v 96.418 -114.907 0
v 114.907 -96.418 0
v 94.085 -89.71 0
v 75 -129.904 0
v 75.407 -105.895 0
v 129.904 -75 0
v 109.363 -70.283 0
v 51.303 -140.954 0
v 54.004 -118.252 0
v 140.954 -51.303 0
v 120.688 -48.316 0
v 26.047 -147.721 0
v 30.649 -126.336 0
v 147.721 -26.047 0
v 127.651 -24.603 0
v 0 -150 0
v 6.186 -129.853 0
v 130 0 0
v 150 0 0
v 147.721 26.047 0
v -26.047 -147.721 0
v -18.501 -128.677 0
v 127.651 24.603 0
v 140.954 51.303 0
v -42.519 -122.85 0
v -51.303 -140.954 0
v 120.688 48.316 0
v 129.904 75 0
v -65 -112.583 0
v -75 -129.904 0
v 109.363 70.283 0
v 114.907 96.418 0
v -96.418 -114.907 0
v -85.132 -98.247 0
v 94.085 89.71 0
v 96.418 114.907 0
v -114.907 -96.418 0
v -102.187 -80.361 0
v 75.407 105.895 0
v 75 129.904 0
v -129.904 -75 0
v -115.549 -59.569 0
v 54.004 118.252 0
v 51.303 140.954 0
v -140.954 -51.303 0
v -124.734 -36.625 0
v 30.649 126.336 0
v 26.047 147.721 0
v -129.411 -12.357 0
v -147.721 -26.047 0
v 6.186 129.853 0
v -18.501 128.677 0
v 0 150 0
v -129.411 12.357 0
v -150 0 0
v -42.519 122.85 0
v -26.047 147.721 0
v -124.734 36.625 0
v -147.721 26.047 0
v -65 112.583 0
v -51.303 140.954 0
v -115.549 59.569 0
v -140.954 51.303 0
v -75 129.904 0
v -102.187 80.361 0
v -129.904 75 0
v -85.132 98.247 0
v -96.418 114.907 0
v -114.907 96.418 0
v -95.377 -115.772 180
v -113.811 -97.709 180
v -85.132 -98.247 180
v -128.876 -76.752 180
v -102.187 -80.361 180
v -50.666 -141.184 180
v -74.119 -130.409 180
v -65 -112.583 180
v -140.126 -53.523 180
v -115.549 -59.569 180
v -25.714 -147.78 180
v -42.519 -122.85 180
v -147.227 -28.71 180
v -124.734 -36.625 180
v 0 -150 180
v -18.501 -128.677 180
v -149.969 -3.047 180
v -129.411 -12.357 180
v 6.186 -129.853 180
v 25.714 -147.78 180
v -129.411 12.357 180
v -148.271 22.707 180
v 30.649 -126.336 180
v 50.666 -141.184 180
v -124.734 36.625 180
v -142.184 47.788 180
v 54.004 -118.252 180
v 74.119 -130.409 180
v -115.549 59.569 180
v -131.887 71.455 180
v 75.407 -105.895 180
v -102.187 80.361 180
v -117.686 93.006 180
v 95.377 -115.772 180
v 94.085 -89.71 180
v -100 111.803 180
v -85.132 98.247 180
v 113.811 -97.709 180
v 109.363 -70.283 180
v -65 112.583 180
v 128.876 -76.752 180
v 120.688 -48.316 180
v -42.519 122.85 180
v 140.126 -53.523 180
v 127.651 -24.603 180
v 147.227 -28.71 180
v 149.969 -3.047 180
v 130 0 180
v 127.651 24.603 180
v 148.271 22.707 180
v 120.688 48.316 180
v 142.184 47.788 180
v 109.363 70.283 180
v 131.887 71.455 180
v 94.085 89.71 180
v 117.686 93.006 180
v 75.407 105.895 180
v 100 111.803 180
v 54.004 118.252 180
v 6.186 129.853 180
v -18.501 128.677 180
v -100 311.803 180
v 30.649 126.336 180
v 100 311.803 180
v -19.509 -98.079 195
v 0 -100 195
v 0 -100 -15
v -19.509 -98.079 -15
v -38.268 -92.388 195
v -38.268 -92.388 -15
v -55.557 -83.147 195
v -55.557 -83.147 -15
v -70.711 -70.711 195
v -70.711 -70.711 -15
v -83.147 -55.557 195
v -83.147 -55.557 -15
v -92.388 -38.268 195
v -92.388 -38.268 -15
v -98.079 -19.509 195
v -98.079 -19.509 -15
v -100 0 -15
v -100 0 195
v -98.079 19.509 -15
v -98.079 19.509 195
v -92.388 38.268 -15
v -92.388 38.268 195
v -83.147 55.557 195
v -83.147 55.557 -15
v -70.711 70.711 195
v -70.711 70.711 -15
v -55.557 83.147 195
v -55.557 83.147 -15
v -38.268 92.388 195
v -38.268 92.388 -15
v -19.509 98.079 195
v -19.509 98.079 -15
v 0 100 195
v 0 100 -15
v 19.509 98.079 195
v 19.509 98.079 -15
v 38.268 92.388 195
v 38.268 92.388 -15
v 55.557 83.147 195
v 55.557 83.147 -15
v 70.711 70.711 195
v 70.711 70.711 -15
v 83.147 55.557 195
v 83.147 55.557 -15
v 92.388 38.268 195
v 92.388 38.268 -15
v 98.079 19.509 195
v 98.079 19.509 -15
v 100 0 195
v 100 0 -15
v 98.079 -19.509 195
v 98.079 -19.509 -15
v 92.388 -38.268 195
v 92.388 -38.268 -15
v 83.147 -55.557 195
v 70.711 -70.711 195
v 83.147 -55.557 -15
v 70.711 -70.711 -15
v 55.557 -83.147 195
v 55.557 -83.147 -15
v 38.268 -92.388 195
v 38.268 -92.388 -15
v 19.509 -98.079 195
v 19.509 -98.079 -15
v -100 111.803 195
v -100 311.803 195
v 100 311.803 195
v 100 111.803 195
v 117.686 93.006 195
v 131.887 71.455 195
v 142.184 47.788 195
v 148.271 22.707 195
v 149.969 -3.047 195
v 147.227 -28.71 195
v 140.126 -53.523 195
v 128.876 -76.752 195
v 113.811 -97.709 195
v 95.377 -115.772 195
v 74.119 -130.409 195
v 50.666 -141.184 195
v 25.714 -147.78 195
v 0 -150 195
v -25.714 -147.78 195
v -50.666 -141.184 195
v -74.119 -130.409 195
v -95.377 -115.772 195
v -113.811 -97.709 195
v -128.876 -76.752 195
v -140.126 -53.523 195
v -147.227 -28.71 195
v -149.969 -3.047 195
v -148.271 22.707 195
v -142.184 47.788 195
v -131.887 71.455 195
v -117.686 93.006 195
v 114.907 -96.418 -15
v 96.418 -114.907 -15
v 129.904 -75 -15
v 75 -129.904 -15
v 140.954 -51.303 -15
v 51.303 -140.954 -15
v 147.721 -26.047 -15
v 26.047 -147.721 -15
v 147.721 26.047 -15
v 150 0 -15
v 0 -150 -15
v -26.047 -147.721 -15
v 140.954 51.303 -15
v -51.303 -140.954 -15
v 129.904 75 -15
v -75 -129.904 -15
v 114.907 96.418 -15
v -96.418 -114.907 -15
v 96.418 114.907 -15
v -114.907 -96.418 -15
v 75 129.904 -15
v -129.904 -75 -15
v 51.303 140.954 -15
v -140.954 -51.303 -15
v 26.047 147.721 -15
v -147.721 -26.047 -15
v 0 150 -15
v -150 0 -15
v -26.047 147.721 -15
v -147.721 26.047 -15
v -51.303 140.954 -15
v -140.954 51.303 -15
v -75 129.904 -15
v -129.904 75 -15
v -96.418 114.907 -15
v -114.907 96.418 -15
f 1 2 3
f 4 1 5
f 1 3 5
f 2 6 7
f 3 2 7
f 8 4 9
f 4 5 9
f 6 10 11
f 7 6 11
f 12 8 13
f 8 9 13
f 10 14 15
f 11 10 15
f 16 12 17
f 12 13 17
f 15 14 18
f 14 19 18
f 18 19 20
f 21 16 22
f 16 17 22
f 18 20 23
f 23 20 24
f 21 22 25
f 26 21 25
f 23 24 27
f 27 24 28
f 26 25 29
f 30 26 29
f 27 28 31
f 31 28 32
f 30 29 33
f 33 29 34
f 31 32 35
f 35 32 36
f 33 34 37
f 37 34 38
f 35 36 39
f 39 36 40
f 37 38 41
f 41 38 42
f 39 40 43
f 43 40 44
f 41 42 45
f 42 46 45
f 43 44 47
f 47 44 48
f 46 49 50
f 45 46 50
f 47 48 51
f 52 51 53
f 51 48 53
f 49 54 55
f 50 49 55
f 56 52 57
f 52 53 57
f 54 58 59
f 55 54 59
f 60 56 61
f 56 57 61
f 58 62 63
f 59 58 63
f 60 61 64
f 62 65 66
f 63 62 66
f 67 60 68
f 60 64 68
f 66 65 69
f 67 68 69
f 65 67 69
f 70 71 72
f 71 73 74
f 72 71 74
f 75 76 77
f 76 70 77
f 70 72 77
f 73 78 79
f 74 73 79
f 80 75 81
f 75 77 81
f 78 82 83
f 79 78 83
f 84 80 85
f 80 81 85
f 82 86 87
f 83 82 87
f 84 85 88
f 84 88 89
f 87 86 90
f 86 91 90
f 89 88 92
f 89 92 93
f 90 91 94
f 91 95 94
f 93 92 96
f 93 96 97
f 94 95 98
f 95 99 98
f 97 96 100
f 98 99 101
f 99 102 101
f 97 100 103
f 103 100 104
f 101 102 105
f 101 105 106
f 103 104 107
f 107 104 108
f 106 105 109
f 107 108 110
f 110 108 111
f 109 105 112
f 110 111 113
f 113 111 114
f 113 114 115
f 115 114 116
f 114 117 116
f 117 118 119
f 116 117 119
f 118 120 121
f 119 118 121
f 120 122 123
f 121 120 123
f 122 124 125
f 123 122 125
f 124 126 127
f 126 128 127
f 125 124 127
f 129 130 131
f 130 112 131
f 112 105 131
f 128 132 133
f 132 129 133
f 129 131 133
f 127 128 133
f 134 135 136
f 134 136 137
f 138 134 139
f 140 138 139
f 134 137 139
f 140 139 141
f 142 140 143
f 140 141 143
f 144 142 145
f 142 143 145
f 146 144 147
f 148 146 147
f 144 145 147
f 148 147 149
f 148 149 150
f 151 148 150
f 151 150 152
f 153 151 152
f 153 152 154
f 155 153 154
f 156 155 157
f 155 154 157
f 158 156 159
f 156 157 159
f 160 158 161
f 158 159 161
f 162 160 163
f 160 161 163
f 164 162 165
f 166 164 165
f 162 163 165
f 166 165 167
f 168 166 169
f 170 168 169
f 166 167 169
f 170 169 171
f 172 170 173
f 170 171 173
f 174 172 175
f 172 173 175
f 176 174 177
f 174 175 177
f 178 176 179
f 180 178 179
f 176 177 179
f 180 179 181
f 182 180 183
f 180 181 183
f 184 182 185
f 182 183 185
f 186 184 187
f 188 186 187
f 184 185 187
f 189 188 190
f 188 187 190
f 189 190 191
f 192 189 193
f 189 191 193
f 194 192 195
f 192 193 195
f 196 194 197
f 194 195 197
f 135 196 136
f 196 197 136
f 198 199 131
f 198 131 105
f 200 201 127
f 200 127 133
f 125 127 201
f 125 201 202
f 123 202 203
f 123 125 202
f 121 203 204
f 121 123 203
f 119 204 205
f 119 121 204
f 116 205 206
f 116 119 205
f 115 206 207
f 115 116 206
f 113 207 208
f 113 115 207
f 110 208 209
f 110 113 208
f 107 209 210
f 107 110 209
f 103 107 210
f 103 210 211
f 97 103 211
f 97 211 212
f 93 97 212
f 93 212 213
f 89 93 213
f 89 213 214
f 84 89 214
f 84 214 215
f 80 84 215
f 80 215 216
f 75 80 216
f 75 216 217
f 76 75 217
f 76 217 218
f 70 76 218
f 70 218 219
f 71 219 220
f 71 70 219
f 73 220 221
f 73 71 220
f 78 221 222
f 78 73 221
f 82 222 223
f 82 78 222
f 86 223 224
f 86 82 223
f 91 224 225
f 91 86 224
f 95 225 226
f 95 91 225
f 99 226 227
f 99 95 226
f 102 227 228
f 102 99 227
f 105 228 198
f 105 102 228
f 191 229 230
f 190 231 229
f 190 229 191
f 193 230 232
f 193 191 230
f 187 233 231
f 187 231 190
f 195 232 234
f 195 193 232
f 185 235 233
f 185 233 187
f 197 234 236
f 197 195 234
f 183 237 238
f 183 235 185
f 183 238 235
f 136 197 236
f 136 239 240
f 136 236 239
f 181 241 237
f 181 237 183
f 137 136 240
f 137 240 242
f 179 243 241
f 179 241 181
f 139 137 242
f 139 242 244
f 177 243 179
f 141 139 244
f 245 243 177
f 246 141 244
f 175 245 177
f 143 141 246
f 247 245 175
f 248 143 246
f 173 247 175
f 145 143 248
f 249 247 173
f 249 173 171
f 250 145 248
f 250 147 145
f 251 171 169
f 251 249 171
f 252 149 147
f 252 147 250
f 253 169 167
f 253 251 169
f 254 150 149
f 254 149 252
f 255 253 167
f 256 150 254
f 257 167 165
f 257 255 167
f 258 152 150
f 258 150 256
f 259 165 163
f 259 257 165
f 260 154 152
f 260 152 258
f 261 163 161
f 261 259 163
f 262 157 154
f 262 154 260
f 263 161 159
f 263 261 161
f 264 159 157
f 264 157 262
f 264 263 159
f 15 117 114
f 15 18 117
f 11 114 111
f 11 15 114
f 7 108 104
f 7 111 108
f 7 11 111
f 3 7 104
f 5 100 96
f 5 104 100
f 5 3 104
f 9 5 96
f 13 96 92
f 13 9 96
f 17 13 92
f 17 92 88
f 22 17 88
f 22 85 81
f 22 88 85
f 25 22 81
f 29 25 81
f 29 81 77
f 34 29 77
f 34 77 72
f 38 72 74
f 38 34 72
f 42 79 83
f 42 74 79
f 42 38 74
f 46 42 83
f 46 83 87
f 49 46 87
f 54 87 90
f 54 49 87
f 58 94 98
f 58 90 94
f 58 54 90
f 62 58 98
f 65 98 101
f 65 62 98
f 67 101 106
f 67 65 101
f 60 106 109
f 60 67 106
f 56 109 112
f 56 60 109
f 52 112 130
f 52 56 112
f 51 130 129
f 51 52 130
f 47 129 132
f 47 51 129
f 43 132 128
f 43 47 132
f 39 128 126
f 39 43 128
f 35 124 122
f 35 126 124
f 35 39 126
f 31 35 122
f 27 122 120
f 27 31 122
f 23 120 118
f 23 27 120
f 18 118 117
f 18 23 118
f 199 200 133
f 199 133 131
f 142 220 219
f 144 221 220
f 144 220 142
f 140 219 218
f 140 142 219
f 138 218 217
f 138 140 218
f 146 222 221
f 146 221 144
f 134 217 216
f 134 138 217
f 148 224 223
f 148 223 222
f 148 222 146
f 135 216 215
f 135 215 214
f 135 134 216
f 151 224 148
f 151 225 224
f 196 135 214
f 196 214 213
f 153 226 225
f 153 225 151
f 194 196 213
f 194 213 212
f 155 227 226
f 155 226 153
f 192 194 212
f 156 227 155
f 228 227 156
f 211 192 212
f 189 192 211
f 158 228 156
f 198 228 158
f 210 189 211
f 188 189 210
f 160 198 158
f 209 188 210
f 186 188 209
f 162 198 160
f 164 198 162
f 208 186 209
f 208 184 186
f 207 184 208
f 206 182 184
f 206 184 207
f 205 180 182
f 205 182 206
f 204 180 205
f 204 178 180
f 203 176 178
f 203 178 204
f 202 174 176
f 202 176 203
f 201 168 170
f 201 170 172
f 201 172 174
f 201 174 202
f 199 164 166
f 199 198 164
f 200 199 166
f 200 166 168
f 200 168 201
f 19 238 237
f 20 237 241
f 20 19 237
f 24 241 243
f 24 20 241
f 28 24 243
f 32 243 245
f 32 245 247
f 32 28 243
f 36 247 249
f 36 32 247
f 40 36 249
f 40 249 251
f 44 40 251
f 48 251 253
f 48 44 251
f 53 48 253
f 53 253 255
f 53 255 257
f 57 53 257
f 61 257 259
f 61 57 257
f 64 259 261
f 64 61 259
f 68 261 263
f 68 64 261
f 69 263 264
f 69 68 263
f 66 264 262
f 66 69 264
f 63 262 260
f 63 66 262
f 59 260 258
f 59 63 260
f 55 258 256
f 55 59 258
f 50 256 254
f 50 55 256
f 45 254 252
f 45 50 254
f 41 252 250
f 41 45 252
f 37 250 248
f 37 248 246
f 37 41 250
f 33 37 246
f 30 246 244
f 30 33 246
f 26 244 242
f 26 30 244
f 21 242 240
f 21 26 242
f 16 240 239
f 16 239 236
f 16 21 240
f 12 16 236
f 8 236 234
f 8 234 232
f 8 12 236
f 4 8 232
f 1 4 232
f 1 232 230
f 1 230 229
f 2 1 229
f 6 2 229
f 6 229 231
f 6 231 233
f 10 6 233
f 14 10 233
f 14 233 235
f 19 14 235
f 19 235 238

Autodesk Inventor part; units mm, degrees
ref_plane "YZ Plane" through (0, 0, 0) normal (1, 0, 0) x (0, 1, 0)
ref_plane "XZ Plane" through (0, 0, 0) normal (0, 1, 0) x (-1, 0, 0)
sketch "Sketch1" plane through (0, 0, 0) normal (0, 0, 1) x (1, 0, 0)
  circle A0 centre (0, 0) radius 130
  dimension "d0" = 260
extrude "Extrusion1" add sketch "Sketch1" along normal blind 180
sketch "Sketch2" plane through (0, 0, 180) normal (0, 0, 1) x (1, 0, 0)
  circle A0 centre (0, 0) radius 150
  dimension "d3" = 300
extrude "Extrusion2" add sketch "Sketch2" along normal blind 15
ref_plane "Work Plane3" through (0, 0, 90) normal (0, 0, -1) x (-1, 0, 0)
mirror "Mirror2" about plane through (0, 0, 90) normal (0, 0, -1) of "Extrusion2"
hole "Hole2" at (0, 0, 195) direction (0, 0, -1) diameter 200 end through all
sketch "Sketch6" plane through (0, 0, 195) normal (0, 0, 1) x (1, 0, 0)
  line L0 (-100, 111.8034) -> (100, 111.8034) construction
  line L1 (100, 111.8034) -> (100, 311.8034)
  line L2 (100, 311.8034) -> (-100, 311.8034)
  line L3 (-100, 311.8034) -> (-100, 111.8034)
  circle A0 centre (0, 0) radius 150 projected
  dimension "d36" = 200
  dimension "d37" = 200
extrude "Extrusion6" add sketch "Sketch6" against normal blind 15 contours A0 L3 L2 L1
properties part number "Generator placement"
